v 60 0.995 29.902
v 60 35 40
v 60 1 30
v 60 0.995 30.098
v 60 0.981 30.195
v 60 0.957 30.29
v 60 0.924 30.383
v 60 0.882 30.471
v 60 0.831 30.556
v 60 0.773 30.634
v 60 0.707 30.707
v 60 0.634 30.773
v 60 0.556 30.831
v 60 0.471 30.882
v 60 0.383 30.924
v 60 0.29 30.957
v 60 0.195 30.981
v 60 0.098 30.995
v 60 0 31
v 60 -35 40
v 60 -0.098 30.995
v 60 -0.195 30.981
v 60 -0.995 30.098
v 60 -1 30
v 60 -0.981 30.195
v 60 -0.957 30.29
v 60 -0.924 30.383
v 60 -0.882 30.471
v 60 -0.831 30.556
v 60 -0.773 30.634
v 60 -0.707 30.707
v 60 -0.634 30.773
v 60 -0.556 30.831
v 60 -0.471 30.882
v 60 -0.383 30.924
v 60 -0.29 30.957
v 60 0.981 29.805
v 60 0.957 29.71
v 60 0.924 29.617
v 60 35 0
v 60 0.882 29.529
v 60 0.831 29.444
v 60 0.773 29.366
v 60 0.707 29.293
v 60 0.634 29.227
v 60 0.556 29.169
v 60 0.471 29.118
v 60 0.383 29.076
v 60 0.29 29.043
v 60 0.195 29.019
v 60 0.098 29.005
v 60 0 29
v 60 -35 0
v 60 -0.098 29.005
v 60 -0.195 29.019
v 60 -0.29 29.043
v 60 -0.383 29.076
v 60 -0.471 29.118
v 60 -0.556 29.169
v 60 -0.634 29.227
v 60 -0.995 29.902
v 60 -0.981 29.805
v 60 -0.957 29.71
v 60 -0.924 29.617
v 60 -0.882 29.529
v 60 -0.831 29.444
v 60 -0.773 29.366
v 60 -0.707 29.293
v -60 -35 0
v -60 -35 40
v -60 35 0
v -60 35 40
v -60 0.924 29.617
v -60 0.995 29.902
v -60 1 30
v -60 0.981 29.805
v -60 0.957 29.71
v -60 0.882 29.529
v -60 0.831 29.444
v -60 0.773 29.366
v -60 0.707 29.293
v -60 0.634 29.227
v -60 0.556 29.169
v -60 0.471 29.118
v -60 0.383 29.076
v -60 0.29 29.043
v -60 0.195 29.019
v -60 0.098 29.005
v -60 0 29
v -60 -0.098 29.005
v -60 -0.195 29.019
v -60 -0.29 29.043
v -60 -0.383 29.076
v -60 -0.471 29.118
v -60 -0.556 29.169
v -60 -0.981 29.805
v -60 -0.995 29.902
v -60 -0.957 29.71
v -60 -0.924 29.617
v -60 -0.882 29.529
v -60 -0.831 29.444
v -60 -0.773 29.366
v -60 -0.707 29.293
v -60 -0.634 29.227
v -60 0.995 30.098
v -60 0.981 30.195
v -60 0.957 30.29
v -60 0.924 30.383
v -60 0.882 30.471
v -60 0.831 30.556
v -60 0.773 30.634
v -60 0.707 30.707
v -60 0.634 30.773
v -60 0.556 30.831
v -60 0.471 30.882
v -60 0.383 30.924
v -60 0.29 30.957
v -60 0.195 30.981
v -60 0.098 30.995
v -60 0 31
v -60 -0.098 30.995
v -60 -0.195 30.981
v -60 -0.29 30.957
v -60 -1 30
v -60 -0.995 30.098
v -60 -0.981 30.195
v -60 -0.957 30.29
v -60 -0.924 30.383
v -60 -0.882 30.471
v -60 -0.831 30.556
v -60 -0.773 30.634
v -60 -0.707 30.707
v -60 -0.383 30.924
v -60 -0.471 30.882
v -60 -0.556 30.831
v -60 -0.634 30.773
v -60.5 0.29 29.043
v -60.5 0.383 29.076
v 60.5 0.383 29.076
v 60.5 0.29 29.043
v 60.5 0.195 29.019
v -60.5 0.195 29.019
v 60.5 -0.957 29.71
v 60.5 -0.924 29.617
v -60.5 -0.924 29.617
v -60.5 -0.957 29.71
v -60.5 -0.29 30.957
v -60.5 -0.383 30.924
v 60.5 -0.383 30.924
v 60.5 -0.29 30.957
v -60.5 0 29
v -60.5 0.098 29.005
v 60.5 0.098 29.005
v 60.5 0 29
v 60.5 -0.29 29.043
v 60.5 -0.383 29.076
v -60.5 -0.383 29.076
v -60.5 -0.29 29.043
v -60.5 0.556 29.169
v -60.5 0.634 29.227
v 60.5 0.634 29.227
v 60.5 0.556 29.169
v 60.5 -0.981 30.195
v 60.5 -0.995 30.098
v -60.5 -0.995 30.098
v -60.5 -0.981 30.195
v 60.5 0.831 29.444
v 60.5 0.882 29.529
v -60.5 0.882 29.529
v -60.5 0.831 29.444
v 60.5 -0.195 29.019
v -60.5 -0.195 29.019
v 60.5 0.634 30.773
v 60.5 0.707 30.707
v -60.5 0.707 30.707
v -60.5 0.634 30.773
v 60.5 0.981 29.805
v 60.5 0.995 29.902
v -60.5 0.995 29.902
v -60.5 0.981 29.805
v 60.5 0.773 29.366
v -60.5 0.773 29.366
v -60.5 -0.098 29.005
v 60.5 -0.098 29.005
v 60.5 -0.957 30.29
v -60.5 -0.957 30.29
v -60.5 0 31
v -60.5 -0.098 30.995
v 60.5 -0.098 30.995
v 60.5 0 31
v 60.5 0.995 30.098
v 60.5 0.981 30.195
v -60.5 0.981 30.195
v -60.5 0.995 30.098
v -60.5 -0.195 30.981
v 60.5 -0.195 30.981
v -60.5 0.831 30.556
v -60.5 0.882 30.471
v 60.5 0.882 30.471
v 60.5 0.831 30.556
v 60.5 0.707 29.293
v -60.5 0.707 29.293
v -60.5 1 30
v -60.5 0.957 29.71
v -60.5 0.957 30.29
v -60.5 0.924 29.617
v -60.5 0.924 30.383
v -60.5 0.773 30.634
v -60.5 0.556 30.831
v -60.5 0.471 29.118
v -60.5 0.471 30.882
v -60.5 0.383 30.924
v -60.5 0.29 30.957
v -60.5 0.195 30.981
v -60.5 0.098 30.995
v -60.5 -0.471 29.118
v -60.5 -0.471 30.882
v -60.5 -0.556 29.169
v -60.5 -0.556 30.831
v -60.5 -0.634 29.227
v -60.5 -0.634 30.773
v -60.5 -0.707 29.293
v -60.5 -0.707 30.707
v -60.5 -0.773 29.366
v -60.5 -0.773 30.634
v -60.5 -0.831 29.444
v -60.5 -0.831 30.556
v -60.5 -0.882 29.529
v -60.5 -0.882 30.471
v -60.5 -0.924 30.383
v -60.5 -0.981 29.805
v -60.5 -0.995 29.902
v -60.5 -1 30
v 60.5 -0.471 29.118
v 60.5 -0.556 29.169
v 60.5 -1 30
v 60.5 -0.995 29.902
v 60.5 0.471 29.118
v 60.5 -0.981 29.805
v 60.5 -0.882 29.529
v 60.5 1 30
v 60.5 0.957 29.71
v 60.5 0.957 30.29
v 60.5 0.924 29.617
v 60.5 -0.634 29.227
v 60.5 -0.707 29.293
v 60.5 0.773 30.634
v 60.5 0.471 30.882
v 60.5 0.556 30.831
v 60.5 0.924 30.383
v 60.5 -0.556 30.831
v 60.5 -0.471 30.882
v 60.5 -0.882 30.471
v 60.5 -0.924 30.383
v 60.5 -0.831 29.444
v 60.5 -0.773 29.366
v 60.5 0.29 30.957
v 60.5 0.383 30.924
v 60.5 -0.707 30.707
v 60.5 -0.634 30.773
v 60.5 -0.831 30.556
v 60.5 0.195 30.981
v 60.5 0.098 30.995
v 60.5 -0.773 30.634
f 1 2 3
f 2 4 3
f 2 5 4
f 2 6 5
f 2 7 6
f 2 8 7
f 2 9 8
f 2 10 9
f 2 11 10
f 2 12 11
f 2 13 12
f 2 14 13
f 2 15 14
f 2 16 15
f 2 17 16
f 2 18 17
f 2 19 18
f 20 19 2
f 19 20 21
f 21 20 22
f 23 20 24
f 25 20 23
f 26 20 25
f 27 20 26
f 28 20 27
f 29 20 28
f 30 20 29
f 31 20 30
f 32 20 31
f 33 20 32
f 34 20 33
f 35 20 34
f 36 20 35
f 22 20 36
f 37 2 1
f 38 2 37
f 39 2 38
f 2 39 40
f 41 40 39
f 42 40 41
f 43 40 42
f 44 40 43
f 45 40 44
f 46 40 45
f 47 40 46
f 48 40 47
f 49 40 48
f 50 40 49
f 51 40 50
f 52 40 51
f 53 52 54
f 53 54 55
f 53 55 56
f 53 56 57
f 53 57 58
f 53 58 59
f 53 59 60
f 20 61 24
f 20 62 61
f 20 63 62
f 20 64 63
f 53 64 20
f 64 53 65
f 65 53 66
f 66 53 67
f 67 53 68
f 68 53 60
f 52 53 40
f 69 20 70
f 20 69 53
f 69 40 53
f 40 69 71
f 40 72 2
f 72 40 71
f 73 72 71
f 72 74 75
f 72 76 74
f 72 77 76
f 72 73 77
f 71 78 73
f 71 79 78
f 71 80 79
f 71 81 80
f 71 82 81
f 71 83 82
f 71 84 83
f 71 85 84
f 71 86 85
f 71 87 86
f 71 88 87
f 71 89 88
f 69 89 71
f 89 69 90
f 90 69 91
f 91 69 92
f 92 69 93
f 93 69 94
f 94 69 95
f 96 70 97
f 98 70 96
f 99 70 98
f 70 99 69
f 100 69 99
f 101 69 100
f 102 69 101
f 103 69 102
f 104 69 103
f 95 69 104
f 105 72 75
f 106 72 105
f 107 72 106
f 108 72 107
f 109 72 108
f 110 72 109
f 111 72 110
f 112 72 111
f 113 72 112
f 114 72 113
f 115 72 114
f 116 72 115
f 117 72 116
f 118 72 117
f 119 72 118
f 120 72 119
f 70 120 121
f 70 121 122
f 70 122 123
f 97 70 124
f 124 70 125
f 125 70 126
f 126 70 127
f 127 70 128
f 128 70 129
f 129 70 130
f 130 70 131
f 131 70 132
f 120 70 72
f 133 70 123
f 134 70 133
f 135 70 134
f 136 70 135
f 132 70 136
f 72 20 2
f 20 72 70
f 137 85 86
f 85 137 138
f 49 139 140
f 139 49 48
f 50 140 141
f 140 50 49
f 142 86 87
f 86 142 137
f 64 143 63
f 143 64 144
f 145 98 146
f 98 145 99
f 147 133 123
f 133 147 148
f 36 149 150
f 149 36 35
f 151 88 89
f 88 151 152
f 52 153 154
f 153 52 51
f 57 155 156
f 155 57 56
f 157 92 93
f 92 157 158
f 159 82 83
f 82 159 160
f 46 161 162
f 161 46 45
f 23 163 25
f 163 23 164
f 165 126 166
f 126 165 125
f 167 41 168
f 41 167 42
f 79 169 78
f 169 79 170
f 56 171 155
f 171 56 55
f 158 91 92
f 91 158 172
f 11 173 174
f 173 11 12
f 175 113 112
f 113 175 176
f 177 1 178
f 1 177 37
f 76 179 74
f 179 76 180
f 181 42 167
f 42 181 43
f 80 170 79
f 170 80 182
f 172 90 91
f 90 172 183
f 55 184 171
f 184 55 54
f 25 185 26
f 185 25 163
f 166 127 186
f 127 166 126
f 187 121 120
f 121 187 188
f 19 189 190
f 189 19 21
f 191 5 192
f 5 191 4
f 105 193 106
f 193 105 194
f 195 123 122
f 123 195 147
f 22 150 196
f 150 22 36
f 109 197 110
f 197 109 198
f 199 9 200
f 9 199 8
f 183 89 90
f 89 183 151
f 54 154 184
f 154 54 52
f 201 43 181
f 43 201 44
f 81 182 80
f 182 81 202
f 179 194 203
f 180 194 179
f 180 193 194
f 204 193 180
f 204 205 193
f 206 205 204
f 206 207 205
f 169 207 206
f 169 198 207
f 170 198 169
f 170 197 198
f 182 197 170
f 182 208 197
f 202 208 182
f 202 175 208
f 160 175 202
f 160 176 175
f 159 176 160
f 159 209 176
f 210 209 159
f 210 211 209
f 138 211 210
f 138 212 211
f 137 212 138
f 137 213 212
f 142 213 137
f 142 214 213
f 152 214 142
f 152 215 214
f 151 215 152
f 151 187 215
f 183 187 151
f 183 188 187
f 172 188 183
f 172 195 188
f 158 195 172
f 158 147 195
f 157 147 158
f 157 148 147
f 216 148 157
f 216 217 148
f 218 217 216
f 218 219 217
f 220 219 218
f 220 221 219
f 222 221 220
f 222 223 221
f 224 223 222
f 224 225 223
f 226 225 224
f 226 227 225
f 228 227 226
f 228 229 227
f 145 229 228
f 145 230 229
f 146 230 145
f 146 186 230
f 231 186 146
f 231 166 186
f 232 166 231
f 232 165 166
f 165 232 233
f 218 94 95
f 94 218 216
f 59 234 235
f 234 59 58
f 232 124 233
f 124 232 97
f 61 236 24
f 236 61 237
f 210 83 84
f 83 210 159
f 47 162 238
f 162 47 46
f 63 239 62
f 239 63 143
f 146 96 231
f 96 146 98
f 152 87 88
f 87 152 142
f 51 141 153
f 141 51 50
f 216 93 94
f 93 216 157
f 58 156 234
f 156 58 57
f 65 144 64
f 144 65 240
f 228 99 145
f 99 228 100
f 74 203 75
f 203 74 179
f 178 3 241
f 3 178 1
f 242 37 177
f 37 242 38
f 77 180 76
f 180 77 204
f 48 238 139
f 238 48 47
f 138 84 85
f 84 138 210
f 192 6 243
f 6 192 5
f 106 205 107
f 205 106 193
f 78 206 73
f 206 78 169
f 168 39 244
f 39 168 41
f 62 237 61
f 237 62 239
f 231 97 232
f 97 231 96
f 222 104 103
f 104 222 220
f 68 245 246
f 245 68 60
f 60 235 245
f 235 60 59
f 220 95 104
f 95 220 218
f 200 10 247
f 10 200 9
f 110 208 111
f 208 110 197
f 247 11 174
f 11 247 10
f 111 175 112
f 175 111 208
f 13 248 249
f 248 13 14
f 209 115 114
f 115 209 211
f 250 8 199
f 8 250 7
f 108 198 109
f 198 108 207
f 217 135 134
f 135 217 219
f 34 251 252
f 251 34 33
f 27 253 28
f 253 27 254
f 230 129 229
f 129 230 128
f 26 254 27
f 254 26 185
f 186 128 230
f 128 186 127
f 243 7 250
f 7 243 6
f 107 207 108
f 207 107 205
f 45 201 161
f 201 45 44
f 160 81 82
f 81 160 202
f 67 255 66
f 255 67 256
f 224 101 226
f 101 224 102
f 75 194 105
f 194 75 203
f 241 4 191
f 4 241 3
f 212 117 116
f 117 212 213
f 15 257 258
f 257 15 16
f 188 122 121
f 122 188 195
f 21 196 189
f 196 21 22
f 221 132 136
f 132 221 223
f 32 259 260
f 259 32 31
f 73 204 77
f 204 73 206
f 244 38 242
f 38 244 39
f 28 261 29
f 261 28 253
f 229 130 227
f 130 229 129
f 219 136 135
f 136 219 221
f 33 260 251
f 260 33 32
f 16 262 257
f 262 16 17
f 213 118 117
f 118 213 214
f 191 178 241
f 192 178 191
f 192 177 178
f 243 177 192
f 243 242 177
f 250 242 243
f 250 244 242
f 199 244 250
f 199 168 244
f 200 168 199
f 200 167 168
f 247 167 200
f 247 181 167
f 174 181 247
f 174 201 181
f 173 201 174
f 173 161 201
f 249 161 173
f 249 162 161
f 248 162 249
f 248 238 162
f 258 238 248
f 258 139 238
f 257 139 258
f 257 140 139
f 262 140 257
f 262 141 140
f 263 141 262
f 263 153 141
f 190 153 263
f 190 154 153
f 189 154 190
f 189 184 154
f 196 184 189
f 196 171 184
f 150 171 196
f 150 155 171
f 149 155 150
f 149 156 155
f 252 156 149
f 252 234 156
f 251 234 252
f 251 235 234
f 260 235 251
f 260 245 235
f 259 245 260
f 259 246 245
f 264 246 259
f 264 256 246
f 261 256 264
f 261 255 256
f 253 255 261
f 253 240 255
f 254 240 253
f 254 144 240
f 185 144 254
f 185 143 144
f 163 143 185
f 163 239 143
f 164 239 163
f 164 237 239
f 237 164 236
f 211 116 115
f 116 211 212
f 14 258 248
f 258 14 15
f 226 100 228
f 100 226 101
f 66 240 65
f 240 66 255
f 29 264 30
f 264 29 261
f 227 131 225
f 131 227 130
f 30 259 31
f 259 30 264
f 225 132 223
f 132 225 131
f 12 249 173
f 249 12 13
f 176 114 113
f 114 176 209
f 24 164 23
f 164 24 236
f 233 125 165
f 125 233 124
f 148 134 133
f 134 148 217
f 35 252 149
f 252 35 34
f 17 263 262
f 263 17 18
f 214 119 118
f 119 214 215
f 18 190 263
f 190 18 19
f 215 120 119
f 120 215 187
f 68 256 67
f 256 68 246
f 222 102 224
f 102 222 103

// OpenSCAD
// Mini horizontal gel-electrophoresis box - buffer tank
// Print orientation: tank rests on XY plane (z = 0), builds upward (+Z)

// ---------------- Parameters ----------------
outer_x      = 120;   // outer length in X (mm)
outer_y      = 70;    // outer width in Y (mm)
outer_z      = 40;    // outer height in Z (mm)
wall         = 3;     // wall thickness (mm)
floor        = 3;     // floor thickness (mm)
platform_x   = 60;    // platform length in X (mm)
platform_y   = 70;    // platform width in Y (mm) (full inner width)
platform_top = 13;    // platform top height above outer bottom (mm)
hole_d       = 2;     // electrode hole diameter (mm)
hole_z       = 30;    // electrode hole height above outer bottom (mm)
eps          = 0.5;   // cutter overshoot past faces (mm)

$fn = 64;

// ---------------- Derived ----------------
inner_x = outer_x - 2 * wall;   // 114 mm
inner_y = outer_y - 2 * wall;   // 64 mm
inner_z = outer_z - floor;      // 37 mm (floor at z = 0..3)
// Platform sits on the inner floor; its top is at z = 13, so it is 10 mm tall.

// ---------------- Model ----------------
union() {
    // Outer tank shell
    hull() {
        // Two solid blocks: left end wall + floor, right end wall + floor
        translate([-outer_x / 2, -outer_y / 2, 0])
            cube([wall, outer_y, outer_z]);
        translate([outer_x / 2 - wall, -outer_y / 2, 0])
            cube([wall, outer_y, outer_z]);
    }

    // Raised platform for the gel tray
    translate([-platform_x / 2, -platform_y / 2, floor])
        cube([platform_x, platform_y, platform_top - floor]);
}

// ---------------- Electrode holes ----------------
// Horizontal 2 mm holes along X, one through each end wall,
// at y = 0, z = 30. The cylinder axis lies along X, so the
// cut passes cleanly through both walls.
translate([0, 0, hole_z])
    rotate([0, 90, 0])
        cylinder(d = hole_d, h = outer_x + 2 * eps, center = true);
